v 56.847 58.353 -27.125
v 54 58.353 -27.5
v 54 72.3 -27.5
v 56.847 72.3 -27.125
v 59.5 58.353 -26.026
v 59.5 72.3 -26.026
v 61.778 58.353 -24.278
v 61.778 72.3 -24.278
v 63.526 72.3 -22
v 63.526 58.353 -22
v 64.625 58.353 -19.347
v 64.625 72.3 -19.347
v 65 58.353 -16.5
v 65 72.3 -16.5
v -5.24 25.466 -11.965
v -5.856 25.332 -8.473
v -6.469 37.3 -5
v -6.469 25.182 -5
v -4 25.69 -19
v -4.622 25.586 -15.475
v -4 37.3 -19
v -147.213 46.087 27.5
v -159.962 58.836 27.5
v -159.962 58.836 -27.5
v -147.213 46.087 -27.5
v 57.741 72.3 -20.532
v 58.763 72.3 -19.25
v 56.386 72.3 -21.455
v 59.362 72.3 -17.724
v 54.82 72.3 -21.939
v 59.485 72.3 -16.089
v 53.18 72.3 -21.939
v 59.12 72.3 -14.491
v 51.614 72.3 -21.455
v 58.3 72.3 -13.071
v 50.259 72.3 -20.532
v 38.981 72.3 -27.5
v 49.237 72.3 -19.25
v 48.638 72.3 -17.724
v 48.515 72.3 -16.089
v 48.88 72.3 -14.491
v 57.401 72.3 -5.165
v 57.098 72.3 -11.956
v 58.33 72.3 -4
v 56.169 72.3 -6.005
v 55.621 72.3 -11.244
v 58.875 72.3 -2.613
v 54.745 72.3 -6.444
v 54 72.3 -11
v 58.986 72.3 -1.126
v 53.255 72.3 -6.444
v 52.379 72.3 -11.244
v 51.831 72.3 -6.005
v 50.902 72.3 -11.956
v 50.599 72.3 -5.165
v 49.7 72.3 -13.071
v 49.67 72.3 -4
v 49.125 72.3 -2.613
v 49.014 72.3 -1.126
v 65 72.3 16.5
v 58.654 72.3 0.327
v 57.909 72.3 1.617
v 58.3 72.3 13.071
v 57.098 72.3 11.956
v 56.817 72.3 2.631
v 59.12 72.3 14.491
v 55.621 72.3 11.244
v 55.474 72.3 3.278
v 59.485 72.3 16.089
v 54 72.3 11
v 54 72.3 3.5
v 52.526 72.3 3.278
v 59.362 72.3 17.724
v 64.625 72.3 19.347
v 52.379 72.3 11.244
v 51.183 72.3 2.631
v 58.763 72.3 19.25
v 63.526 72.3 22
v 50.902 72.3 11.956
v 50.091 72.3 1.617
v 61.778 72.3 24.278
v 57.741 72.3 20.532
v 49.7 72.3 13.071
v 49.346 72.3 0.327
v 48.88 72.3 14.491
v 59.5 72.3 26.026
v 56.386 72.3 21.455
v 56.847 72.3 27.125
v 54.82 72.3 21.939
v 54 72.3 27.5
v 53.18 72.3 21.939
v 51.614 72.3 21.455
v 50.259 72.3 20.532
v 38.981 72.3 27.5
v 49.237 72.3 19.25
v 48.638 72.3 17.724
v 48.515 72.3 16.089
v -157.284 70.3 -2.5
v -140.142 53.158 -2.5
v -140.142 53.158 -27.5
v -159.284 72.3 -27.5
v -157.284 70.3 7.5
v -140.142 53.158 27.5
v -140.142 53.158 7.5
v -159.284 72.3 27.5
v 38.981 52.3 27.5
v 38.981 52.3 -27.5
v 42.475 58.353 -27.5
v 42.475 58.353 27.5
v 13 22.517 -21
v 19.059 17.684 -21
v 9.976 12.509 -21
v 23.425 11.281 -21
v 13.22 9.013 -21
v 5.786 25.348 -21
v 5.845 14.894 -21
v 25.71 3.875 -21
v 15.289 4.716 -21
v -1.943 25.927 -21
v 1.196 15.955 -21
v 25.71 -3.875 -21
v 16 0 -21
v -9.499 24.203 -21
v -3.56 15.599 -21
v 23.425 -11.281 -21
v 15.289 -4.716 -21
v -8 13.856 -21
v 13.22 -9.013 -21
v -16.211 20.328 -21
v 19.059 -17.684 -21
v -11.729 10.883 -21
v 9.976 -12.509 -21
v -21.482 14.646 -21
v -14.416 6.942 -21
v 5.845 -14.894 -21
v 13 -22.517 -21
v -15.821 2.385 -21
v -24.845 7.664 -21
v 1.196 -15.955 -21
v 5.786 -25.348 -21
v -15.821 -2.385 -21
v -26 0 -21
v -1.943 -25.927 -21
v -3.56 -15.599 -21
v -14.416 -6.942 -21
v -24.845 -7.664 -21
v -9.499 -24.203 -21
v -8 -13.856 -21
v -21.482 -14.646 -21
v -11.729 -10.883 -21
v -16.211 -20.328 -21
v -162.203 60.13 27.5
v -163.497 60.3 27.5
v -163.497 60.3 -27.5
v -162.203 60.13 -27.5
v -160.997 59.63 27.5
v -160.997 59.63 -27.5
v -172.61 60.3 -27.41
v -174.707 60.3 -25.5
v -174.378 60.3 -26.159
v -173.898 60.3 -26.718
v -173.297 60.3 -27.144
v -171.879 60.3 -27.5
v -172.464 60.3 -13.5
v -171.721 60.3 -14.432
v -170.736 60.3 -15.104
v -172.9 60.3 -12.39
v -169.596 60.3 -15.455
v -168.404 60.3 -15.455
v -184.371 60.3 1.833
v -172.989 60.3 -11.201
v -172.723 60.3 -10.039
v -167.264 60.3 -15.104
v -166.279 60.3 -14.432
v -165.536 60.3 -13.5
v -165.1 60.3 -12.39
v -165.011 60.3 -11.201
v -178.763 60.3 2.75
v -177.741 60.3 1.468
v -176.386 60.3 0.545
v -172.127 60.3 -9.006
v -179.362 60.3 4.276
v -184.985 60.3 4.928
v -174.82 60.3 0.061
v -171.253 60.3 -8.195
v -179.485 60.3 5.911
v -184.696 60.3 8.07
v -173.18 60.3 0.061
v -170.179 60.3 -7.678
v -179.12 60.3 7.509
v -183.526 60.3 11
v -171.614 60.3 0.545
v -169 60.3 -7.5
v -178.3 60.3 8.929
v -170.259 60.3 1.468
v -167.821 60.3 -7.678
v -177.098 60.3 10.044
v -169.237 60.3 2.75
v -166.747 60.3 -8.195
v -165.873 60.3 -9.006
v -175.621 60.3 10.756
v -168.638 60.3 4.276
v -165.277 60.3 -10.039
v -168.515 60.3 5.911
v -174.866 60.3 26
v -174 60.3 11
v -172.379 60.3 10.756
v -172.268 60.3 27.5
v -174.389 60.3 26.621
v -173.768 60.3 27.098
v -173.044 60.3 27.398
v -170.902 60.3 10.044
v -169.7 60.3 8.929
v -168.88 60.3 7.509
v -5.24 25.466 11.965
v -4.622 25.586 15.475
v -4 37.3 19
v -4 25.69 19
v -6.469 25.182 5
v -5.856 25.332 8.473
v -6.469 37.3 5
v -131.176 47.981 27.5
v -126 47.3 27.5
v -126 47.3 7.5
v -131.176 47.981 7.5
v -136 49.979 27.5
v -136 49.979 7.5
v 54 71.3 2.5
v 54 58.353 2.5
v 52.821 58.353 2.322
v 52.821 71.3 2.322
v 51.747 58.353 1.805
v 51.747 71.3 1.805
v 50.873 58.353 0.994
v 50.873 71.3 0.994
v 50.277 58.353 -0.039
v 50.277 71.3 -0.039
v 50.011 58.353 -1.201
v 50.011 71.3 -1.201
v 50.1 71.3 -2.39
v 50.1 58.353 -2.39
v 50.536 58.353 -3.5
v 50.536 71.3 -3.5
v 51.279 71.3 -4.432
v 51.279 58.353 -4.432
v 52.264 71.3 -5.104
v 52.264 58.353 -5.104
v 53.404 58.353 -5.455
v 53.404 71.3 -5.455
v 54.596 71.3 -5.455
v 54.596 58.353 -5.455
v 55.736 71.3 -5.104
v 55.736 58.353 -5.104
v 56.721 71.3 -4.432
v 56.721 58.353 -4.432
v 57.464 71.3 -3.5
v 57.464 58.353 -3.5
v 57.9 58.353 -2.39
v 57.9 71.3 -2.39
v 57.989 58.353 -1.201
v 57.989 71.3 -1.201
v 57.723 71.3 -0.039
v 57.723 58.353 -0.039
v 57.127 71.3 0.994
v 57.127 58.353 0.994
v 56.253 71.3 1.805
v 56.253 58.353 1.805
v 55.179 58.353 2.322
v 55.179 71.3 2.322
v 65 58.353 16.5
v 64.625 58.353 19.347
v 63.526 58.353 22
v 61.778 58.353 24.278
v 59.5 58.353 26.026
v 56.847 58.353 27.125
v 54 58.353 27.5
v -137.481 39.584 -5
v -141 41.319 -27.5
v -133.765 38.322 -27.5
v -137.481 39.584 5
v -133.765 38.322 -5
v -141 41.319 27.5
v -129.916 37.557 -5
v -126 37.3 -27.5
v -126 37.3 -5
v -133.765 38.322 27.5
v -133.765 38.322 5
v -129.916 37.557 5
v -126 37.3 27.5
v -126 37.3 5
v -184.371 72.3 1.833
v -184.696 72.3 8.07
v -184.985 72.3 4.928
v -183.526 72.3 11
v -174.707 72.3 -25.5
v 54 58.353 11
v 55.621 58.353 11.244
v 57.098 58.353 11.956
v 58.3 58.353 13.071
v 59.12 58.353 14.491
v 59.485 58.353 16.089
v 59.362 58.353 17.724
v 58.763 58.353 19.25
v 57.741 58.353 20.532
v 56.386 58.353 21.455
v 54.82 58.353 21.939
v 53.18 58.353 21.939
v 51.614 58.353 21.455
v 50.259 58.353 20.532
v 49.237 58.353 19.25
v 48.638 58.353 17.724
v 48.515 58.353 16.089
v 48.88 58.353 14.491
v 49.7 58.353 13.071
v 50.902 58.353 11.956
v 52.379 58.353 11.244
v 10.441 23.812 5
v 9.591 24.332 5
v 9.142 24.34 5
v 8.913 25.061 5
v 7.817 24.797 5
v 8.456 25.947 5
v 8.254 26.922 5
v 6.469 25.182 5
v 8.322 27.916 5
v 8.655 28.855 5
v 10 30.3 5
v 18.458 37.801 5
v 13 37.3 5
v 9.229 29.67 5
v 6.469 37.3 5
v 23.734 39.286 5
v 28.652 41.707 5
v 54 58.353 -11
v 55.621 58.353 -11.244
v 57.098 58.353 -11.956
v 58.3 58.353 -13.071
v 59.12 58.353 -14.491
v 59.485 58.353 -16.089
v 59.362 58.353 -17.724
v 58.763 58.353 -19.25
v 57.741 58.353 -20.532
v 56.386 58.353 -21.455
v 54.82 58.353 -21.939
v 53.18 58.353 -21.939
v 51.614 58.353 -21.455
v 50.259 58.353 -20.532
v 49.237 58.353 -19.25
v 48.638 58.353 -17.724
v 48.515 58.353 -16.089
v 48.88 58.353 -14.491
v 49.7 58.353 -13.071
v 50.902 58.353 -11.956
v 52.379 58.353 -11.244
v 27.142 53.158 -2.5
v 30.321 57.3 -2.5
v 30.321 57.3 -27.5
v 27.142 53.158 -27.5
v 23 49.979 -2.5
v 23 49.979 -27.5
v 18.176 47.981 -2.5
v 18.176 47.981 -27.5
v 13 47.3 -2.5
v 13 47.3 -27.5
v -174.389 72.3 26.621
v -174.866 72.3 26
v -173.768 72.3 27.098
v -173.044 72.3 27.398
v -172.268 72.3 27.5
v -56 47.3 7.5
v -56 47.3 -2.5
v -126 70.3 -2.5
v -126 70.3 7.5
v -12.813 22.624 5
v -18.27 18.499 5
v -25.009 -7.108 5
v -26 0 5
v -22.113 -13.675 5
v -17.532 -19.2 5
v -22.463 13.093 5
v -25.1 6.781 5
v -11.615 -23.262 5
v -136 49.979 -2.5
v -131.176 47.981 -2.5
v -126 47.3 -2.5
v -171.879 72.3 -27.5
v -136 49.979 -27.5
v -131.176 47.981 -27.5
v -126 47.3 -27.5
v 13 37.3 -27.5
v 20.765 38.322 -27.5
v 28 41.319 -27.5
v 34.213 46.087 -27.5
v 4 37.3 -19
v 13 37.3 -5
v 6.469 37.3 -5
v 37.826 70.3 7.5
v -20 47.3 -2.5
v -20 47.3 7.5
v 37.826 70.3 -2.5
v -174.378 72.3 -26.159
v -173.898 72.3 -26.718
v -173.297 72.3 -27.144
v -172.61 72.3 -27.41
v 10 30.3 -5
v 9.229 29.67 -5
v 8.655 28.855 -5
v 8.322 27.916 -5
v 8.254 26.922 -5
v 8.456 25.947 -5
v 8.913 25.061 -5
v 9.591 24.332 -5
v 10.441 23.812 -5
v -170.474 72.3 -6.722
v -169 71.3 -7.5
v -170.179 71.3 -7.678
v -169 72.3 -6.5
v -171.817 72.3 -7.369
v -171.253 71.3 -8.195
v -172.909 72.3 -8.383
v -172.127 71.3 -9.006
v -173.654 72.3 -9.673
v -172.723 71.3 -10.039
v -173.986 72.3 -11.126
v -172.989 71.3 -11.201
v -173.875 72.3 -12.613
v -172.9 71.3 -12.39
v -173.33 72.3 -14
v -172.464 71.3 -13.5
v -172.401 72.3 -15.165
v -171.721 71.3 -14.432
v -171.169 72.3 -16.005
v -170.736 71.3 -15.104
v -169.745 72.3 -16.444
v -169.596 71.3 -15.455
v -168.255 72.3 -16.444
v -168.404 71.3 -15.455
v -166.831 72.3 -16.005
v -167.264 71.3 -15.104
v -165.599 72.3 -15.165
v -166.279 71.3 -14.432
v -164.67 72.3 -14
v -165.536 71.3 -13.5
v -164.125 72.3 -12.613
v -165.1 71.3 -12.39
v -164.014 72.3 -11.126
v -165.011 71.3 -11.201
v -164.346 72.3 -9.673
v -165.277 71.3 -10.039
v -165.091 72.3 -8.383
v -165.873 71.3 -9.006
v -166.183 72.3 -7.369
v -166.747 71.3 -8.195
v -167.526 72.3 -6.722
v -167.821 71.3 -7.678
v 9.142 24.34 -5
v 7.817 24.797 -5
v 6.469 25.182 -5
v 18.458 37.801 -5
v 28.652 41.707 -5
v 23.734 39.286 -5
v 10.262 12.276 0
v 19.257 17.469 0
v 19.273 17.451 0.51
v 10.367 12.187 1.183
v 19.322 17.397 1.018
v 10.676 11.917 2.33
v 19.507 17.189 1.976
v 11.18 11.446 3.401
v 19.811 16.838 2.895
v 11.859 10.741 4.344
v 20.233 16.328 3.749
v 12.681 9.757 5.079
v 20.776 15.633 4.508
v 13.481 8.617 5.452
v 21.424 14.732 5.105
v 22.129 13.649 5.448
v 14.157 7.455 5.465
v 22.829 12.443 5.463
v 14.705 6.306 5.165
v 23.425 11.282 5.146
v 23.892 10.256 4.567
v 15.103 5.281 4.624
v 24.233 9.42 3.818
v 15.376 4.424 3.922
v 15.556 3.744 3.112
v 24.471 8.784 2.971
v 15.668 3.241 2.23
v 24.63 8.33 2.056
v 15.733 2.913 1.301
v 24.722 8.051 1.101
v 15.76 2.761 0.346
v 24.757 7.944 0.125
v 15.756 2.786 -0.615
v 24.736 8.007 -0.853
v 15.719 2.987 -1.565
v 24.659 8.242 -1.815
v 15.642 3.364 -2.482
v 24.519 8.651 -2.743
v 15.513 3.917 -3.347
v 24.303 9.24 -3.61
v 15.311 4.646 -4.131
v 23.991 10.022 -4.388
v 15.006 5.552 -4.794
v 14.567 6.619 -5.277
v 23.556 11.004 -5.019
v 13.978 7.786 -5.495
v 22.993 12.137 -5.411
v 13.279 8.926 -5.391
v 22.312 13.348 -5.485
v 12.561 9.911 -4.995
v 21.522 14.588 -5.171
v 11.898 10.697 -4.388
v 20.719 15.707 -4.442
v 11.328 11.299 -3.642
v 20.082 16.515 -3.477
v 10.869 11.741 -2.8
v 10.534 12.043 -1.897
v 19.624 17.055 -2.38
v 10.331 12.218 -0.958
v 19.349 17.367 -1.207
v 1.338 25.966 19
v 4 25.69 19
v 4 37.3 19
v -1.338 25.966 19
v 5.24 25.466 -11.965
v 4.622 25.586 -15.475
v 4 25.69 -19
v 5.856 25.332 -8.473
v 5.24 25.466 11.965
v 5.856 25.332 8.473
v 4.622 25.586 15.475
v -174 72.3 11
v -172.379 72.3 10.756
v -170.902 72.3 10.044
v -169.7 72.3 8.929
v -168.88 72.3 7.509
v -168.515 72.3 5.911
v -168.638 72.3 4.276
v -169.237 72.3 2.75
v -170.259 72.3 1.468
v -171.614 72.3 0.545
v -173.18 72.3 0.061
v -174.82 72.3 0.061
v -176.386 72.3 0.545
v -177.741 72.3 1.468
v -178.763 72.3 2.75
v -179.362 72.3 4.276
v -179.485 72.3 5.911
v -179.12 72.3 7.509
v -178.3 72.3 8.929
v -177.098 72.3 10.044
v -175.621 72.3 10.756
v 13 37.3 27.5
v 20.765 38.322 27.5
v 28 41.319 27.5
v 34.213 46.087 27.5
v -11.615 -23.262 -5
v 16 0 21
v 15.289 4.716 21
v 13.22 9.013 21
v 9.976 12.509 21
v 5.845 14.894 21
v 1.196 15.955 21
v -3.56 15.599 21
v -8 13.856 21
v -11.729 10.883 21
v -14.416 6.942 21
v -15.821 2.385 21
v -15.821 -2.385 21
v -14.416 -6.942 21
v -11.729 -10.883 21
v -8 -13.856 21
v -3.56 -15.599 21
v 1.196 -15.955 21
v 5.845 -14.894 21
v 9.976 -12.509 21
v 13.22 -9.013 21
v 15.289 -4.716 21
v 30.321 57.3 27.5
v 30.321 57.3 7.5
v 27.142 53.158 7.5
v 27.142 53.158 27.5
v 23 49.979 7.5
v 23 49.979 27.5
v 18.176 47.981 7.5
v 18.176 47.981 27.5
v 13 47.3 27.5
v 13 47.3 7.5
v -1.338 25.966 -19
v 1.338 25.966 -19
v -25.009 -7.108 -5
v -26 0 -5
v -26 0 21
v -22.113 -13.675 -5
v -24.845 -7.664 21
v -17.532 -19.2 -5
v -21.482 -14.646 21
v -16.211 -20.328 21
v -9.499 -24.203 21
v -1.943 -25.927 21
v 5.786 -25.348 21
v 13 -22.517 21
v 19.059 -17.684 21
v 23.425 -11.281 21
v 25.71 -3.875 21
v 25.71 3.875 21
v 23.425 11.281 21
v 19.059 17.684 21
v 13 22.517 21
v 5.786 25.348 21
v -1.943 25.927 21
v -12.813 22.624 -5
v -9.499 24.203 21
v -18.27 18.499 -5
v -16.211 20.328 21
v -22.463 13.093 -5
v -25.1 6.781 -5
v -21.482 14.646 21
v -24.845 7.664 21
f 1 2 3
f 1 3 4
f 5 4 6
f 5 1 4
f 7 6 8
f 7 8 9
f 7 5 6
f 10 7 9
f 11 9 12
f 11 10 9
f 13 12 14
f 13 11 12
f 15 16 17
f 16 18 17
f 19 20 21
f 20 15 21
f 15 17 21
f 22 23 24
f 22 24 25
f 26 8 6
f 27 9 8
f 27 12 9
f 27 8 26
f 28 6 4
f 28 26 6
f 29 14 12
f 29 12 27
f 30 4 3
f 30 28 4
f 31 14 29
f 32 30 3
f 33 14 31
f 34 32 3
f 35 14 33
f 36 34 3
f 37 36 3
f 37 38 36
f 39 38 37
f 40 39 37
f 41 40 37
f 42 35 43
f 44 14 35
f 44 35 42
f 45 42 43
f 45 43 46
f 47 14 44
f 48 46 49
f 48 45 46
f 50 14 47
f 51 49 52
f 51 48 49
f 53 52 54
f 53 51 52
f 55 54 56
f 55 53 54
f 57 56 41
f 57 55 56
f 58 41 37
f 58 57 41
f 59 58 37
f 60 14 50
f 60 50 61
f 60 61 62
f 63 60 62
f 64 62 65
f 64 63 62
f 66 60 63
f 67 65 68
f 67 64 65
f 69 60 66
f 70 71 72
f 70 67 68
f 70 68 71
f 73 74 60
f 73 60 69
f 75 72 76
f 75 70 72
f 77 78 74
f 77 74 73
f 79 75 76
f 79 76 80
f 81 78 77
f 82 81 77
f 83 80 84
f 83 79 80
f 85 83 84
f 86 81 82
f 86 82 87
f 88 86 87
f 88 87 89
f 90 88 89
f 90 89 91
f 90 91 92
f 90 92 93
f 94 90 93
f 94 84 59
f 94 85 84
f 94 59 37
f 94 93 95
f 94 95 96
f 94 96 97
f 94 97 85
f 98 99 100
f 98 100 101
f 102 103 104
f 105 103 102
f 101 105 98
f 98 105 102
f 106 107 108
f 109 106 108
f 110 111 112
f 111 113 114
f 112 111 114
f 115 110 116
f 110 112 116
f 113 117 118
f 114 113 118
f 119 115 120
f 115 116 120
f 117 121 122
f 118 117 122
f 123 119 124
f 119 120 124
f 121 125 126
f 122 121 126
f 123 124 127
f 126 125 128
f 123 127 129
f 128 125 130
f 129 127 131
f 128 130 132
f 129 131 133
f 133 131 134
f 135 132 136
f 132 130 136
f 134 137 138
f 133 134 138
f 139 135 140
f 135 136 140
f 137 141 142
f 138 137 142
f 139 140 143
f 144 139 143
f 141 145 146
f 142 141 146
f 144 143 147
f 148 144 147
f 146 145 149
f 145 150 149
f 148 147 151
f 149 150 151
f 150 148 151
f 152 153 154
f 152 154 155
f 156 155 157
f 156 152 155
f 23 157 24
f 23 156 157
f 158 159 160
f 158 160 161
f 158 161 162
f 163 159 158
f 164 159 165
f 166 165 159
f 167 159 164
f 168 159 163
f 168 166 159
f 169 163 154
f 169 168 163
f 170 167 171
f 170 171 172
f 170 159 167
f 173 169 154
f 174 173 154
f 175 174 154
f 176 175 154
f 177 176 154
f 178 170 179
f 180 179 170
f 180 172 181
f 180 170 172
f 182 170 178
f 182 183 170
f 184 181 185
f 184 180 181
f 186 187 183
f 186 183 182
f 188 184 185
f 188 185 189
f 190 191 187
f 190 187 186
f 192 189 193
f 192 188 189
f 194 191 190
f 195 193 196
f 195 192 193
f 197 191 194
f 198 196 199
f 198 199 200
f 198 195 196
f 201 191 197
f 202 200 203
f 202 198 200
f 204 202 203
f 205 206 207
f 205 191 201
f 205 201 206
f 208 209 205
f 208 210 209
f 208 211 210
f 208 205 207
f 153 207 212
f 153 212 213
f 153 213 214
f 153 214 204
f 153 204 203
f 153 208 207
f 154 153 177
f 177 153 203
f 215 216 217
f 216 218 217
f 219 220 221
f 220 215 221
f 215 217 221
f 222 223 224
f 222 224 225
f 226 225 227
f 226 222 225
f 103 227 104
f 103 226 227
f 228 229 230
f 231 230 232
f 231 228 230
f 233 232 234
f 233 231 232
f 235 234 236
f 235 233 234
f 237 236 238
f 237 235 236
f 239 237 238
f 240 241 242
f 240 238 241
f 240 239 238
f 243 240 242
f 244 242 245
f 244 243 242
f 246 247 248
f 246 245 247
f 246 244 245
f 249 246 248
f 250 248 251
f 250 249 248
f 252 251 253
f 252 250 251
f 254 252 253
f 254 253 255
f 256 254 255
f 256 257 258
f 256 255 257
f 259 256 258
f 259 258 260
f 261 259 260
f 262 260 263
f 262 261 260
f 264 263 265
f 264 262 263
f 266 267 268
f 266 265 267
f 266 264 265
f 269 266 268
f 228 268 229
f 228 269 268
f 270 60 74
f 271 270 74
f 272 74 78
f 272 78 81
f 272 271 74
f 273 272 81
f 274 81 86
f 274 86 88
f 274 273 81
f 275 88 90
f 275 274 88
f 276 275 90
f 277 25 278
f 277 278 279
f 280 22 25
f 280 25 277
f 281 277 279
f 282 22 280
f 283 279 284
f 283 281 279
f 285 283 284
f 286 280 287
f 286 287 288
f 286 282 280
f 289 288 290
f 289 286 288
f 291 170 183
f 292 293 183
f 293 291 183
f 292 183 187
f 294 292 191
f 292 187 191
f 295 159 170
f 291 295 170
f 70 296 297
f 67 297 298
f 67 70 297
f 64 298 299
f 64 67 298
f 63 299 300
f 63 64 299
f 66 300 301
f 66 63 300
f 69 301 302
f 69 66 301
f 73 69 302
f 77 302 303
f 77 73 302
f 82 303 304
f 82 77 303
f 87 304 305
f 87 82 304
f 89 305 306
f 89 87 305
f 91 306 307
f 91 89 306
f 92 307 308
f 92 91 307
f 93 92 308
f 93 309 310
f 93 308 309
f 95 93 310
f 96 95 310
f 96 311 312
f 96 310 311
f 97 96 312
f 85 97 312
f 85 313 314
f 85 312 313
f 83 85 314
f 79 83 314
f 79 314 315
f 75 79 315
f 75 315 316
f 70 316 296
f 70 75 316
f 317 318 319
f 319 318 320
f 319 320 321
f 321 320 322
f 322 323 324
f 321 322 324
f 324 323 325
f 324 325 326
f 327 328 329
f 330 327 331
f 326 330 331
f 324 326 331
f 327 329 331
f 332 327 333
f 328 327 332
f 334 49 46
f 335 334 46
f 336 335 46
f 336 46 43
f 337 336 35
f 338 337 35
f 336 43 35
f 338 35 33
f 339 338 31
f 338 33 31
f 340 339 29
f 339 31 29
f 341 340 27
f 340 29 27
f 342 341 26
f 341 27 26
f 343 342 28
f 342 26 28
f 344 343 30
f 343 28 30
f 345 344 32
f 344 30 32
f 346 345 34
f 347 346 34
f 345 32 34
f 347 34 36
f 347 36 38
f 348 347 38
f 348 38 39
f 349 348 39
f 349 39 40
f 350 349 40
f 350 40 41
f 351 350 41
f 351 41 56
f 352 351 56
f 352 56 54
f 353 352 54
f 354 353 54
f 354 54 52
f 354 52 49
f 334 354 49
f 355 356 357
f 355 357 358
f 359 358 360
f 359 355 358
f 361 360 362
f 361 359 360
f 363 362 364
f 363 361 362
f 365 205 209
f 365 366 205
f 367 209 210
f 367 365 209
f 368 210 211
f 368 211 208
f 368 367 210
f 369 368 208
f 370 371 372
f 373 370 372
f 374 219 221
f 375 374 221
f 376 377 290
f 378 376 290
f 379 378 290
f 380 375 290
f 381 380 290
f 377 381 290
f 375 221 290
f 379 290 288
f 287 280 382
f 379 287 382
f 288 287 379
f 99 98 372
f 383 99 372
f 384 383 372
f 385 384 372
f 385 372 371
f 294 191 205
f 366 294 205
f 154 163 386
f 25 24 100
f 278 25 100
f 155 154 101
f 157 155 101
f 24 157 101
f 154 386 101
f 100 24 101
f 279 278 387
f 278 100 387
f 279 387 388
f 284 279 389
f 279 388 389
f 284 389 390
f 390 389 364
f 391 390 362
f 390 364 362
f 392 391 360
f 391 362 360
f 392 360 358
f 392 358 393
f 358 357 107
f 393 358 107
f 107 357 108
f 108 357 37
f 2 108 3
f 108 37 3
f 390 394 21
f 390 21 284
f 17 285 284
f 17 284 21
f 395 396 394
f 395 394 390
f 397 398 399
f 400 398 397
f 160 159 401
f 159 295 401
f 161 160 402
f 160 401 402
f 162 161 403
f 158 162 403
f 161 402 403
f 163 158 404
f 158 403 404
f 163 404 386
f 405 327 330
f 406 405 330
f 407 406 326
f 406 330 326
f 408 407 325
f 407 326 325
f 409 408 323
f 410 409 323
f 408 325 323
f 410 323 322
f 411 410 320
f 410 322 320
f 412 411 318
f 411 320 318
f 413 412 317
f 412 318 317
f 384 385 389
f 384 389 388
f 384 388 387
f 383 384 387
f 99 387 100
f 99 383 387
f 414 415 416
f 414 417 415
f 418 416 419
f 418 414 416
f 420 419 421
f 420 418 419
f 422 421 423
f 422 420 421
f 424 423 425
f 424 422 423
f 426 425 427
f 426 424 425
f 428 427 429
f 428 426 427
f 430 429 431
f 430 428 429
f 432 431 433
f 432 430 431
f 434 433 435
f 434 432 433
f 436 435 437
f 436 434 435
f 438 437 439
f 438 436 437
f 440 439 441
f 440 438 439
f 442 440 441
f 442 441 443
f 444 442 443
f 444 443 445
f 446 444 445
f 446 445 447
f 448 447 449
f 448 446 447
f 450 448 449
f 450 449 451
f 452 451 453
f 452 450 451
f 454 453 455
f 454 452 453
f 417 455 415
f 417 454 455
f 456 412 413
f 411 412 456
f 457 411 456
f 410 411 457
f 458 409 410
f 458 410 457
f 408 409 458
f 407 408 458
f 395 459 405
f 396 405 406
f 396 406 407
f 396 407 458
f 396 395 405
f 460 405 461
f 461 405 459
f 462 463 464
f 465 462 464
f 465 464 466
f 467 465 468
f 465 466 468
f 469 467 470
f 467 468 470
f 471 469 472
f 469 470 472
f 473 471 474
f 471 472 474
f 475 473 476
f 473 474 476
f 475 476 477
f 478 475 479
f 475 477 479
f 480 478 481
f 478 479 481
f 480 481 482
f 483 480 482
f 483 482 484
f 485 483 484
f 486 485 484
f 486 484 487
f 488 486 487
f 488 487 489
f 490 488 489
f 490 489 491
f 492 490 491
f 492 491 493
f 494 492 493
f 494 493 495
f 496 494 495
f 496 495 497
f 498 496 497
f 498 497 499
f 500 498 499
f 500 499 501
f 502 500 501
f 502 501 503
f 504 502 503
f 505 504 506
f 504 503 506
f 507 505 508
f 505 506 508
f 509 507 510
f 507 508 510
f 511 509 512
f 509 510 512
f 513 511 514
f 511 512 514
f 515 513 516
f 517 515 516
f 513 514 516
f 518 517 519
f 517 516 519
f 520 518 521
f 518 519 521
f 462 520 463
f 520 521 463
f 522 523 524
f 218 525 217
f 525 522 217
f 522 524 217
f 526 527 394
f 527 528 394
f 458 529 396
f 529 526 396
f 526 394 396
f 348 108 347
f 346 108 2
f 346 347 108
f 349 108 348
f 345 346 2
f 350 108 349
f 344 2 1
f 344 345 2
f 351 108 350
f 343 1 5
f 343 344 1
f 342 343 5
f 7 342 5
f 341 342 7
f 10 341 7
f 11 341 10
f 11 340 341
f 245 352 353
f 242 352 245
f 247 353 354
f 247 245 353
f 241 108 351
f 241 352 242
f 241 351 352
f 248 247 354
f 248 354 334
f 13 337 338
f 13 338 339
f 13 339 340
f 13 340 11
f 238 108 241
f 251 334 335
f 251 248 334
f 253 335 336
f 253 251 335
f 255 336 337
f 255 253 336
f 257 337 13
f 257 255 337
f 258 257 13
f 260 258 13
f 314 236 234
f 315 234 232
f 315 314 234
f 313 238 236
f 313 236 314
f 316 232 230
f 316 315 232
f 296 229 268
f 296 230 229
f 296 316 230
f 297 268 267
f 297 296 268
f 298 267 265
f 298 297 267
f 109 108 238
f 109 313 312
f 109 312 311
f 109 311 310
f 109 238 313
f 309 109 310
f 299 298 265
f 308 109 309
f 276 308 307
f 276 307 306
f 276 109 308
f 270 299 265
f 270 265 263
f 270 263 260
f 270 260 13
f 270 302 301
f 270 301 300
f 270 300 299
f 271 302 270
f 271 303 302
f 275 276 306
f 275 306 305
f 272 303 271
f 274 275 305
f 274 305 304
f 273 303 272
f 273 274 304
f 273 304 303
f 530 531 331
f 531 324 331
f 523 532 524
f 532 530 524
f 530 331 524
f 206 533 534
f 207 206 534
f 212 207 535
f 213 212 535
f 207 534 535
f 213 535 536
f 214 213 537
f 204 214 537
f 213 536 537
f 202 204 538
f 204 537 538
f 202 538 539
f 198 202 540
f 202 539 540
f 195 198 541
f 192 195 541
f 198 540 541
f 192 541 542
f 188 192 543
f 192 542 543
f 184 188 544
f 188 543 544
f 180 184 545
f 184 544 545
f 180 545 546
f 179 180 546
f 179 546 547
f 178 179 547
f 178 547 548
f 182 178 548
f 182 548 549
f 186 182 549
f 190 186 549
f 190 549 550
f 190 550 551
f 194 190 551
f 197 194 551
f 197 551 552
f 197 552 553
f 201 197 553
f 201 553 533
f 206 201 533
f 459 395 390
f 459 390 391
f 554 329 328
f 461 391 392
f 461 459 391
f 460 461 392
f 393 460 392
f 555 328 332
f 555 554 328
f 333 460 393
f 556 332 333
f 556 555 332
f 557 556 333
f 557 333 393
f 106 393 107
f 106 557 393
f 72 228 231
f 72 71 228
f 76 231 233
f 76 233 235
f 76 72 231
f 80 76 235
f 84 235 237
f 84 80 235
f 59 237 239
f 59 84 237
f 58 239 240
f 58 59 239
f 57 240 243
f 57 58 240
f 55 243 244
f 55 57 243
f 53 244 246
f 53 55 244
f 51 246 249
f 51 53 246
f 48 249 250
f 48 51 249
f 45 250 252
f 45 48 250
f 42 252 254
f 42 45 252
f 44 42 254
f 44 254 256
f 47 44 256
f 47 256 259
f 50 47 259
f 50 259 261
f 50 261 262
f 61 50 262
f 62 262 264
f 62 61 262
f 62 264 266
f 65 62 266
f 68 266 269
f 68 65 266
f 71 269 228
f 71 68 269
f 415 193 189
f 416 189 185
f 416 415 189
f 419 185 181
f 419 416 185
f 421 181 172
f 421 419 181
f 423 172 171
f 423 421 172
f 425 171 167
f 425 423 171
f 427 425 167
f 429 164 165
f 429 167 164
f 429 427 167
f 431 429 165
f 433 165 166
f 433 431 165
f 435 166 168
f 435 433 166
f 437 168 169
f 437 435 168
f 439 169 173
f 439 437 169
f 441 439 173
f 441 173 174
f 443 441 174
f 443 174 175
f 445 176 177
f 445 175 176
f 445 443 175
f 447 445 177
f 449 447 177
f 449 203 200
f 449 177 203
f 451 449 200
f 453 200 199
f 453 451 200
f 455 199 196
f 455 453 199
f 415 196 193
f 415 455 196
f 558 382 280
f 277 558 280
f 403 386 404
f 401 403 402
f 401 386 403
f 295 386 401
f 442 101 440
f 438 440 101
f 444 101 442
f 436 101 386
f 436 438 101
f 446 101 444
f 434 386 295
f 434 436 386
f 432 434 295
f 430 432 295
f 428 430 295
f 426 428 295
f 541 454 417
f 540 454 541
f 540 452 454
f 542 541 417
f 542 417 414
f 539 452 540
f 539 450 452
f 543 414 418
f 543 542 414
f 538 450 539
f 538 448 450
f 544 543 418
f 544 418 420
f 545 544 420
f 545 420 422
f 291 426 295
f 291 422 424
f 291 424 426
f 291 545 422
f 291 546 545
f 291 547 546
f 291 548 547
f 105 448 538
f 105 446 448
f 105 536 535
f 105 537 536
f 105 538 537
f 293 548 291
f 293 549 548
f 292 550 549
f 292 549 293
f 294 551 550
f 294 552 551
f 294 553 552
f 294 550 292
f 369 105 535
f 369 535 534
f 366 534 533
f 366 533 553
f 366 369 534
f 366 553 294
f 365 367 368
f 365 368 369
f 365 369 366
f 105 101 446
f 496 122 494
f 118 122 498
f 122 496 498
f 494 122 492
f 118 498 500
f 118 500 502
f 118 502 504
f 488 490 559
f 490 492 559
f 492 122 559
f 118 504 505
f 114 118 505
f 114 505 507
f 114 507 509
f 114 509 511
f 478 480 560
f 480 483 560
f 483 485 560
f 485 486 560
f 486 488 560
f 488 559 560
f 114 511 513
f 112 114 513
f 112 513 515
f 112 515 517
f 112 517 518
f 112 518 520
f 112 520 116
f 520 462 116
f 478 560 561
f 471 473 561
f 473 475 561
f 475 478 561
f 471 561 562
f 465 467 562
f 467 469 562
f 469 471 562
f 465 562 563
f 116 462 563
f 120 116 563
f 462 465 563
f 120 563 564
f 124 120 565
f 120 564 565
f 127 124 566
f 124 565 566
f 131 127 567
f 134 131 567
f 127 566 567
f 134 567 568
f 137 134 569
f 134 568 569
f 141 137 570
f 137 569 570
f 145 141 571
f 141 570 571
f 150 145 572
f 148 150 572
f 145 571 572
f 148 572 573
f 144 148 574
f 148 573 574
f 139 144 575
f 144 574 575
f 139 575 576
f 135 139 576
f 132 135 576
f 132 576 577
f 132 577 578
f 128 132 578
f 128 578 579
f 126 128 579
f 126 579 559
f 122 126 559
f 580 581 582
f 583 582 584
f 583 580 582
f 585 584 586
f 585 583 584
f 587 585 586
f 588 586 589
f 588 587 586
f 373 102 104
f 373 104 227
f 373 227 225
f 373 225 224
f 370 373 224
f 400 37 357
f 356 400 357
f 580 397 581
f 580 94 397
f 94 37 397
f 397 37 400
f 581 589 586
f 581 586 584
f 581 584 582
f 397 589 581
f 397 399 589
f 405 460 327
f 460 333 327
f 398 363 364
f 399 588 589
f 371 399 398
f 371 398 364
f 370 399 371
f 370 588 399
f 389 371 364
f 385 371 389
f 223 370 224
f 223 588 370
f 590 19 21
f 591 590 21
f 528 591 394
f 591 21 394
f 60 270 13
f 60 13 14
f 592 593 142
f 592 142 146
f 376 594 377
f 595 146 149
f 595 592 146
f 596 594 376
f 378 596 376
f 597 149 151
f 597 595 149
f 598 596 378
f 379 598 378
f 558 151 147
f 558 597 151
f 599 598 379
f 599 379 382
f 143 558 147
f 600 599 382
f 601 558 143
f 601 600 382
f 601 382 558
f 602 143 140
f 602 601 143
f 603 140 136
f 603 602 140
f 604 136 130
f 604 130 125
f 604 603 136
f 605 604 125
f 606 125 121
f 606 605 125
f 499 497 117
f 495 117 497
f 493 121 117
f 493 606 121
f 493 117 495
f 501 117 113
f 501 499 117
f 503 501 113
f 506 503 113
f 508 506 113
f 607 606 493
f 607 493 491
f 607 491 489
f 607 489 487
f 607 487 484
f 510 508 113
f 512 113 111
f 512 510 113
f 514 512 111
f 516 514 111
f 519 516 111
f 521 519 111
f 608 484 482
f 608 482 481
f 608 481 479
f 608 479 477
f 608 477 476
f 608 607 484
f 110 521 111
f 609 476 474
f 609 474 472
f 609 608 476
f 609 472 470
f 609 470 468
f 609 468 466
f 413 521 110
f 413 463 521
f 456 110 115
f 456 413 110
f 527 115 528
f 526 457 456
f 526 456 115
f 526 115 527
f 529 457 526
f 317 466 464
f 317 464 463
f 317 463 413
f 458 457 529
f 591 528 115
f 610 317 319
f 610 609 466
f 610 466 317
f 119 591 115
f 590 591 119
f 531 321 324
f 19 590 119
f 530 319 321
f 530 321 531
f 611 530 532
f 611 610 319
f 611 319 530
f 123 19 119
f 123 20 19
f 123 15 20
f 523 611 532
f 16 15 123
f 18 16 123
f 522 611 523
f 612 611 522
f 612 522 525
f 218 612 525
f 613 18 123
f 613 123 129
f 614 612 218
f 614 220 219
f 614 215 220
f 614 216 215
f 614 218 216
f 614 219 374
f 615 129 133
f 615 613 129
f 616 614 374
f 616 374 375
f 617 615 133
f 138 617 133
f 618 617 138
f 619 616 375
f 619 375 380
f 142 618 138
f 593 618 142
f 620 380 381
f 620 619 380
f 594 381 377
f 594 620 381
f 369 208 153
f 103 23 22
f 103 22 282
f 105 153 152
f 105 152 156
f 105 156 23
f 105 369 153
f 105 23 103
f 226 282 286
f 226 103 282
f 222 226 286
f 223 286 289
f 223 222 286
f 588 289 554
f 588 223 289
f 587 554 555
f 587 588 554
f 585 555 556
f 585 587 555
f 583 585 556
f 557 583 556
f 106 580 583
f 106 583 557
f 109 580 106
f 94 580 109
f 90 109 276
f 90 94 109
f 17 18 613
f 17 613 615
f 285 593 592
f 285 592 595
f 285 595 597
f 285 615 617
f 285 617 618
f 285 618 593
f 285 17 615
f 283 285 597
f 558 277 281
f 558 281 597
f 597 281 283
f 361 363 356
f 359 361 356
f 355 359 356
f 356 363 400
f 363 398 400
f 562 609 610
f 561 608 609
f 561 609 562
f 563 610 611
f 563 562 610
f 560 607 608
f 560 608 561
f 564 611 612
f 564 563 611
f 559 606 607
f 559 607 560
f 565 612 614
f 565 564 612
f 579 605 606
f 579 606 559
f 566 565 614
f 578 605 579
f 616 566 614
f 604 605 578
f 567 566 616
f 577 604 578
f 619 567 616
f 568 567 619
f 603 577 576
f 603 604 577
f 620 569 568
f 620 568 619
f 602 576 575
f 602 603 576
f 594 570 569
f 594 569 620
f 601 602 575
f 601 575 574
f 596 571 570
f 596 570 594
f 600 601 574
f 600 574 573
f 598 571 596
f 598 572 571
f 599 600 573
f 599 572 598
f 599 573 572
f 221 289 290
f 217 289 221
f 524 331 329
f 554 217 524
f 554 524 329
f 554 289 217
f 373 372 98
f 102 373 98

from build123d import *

# Parameters (mm, degrees)
SKETCH_1_R               = 26
EXTRUDE_1_DEPTH          = 21
SKETCH_2_R               = 16
CUT_EXTRUDE_1_DEPTH      = 56.821142948
CUT_EXTRUDE_2_REACH      = 67.695
CUT_EXTRUDE_2_END_RADIUS = 16
SKETCH_3_R               = 5.5
EXTRUDE_2_DEPTH          = 27.5
CUT_EXTRUDE_4_DEPTH      = 212.291599501
CUT_EXTRUDE_4_DEPTH_BACK = 212.291599501
CUT_EXTRUDE_START        = -13.947107552
CUT_EXTRUDE_6_DEPTH      = 13.947107552
SKETCH_7_R               = 5.5
CUT_EXTRUDE_7_DEPTH      = 212.291599501
SKETCH_8_R               = 5.5
CUT_EXTRUDE_8_DEPTH      = 212.291599501
RIB_1_DEPTH              = 10
FILLET_1_R               = 3
RIB_8_REACH              = 202.879
SKETCH_16_WALL_W         = 465.989842276
SKETCH_16_WALL_H         = 10
EXTRUDE_3_DEPTH          = 5
EXTRUDE_4_REACH          = 199.454
EXTRUDE_4_END_RADIUS     = 26


# Read off the part's stored shape, not the designer's step: 切除-拉伸6, 筋1
with BuildPart() as part:
    # 草图1 → 凸台-拉伸1 (new, symmetric)
    with BuildSketch(Plane.XY):
        with Locations(Location((0, 0, 0), (0, 0, 180))):
            Circle(SKETCH_1_R)
    extrude(amount=EXTRUDE_1_DEPTH, both=True)

    # 草图2 → 切除-拉伸1 (cut, through all)
    with BuildSketch(Plane.XY.offset(21)):
        Circle(SKETCH_2_R)
    extrude(amount=-CUT_EXTRUDE_1_DEPTH, mode=Mode.SUBTRACT)

    # 切除-拉伸2: up to this cylinder (the profile starts outside it)
    cut_extrude_2_end = Plane(origin=(0, 0, 0), z_dir=(0, 0, 1)) * Cylinder(CUT_EXTRUDE_2_END_RADIUS, 168.39, mode=Mode.PRIVATE)
    # 草图3 → 切除-拉伸2 (cut, up to the surface)
    with BuildSketch(Plane(origin=(22.516660498, 13, 0), x_dir=(0, 0, -1), z_dir=(0.8660254037844398, 0.499999999999998, 0)), mode=Mode.PRIVATE) as cut_extrude_2_sk1:
        with Locations(Location((0, 0, 0), (0, 0, 90))):
            Circle(SKETCH_3_R)
    cut_extrude_2_tool1 = extrude(cut_extrude_2_sk1.sketch, amount=-CUT_EXTRUDE_2_REACH, mode=Mode.PRIVATE) - cut_extrude_2_end
    add(cut_extrude_2_tool1.solids().sort_by_distance((22.51666, 13, 0))[0], mode=Mode.SUBTRACT)



with BuildPart() as body_2:
    # 草图4 → 凸台-拉伸2 (new, symmetric)
    with BuildSketch(Plane.XY):
        with BuildLine():
            Line((-185, 60.3), (-163.497474683, 60.3))
            ThreePointArc((-163.497474683, 60.3), (-161.584057521, 59.919397663), (-159.961940777, 58.835533906))
            Line((-159.961940777, 58.835533906), (-147.213203436, 46.086796564))
            ThreePointArc((-147.213203436, 46.086796564), (-137.480502971, 39.583614025), (-126, 37.3))
            Line((-126, 37.3), (13, 37.3))
            ThreePointArc((13, 37.3), (28, 41.319237886), (38.980762114, 52.3))
            Line((38.980762114, 52.3), (42.475401198, 58.352892448))
            Line((42.475401198, 58.352892448), (65, 58.352892448))
            Line((65, 58.352892448), (65, 72.3))
            Line((65, 72.3), (38.980762114, 72.3))
            Line((38.980762114, 72.3), (30.320508076, 57.3))
            ThreePointArc((30.320508076, 57.3), (23, 49.979491924), (13, 47.3))
            Line((13, 47.3), (-126, 47.3))
            ThreePointArc((-126, 47.3), (-133.653668647, 48.82240935), (-140.142135624, 53.157864376))
            Line((-140.142135624, 53.157864376), (-159.284271247, 72.3))
            Line((-159.284271247, 72.3), (-185, 72.3))
            Line((-185, 72.3), (-185, 60.3))
        make_face()
    extrude(amount=EXTRUDE_2_DEPTH, both=True)

    # 草图5 → 切除-拉伸4 (cut, two sides: drawn at the far end of the back side and taken through both)
    with BuildSketch(Plane(origin=(0, 72.3, 0), x_dir=(1, 0, 0), z_dir=(0, 1, 0)).offset(-CUT_EXTRUDE_4_DEPTH_BACK)):
        with BuildLine():
            Line((-7.168790364, 499.369918589), (-174, 27.5))
            Line((-174, 27.5), (-184.370899457, -1.833333333))
            ThreePointArc((-184.370899457, -1.833333333), (-184.953601074, -6.509268805), (-183.526279442, -11))
            Line((-183.526279442, -11), (-174, -27.5))
            Line((-174, -27.5), (76.246814454, -460.940197067))
            Line((76.246814454, -460.940197067), (-920.985347946, -547.562968831))
            Line((-920.985347946, -547.562968831), (-1004.400952764, 412.747146826))
            Line((-1004.400952764, 412.747146826), (-7.168790364, 499.369918589))
        make_face()
    extrude(amount=CUT_EXTRUDE_4_DEPTH + CUT_EXTRUDE_4_DEPTH_BACK, mode=Mode.SUBTRACT)

    # 切除-拉伸6 outline → 切除-拉伸6 (cut)
    with BuildSketch(Plane(origin=(0, 72.3, 0), x_dir=(1, 0, 0), z_dir=(0, 1, 0)).offset(CUT_EXTRUDE_START)):
        with BuildLine():
            Line((65, -27.5), (65, -16.5))
            ThreePointArc((65, -16.5), (61.778174593, -24.278174593), (54, -27.5))
            Line((54, -27.5), (65, -27.5))
        make_face()
        with BuildLine():
            ThreePointArc((54, 27.5), (61.778174593, 24.278174593), (65, 16.5))
            Line((65, 16.5), (65, 27.5))
            Line((65, 27.5), (54, 27.5))
        make_face()
    extrude(amount=CUT_EXTRUDE_6_DEPTH, mode=Mode.SUBTRACT)

    # 草图7 → 切除-拉伸7 (cut, through all)
    with BuildSketch(Plane(origin=(0, 72.3, 0), x_dir=(1, 0, 0), z_dir=(0, 1, 0))):
        with Locations(Location((54, 16.5, 0), (0, 0, 270))):
            Circle(SKETCH_7_R)
    cut_extrude_7 = extrude(amount=-CUT_EXTRUDE_7_DEPTH, mode=Mode.SUBTRACT)

    # 镜向1: 切除-拉伸7 across plane
    add(cut_extrude_7.mirror(Plane.XY), mode=Mode.SUBTRACT)

    # 草图8 → 切除-拉伸8 (cut, through all)
    with BuildSketch(Plane(origin=(0, 72.3, 0), x_dir=(1, 0, 0), z_dir=(0, 1, 0))):
        with Locations(Location((-174, -5.5, 0), (0, 0, 270))):
            Circle(SKETCH_8_R)
    extrude(amount=-CUT_EXTRUDE_8_DEPTH, mode=Mode.SUBTRACT)

    # 草图10 → Ø8.0mm 暗销孔1 (revolve, cut)
    with BuildSketch(Plane(origin=(54, 72.3, -1.5), x_dir=(0, 0, 1), z_dir=(1, 0, 0))):
        Polygon((0, 0), (0, 13.948107552), (4, 13.948107552), (4, 1), (5, 0), align=None)
    revolve(axis=Axis((54, 78.65, -1.5), (0, -1, 0)), mode=Mode.SUBTRACT)

    # 草图12 → Ø8.0mm 暗销孔2 (revolve, cut)
    with BuildSketch(Plane(origin=(-169, 72.3, -11.5), x_dir=(0, 0, 1), z_dir=(1, 0, 0))):
        Polygon((0, 0), (0, 12.001), (4, 12.001), (4, 1), (5, 0), align=None)
    revolve(axis=Axis((-169, 78.65, -11.5), (0, -1, 0)), mode=Mode.SUBTRACT)

    # 筋1 outline → 筋1 (add)
    with BuildSketch(Plane.XY.offset(-2.5)):
        with BuildLine():
            Line((-56, 47.3), (-126, 70.3))
            Line((-126, 70.3), (-157.284271247, 70.3))
            Line((-157.284271247, 70.3), (-140.142135624, 53.157864376))
            ThreePointArc((-140.142135624, 53.157864376), (-133.653668647, 48.82240935), (-126, 47.3))
            Line((-126, 47.3), (-56, 47.3))
        make_face()
    extrude(amount=RIB_1_DEPTH)

    # 圆角1
    fillet_1_edges = [body_2.edges().sort_by_distance(p)[0] for p in [
        (-174, 66.3, -27.5),
        (-174, 66.3, 27.5),
    ]]
    fillet(fillet_1_edges, radius=FILLET_1_R)

    # 草图16 wall → 筋8 (add, up to next)
    with BuildSketch(Plane(origin=(8.913030787, 58.8, -2.5), x_dir=(0.929197613161, 0.369583273019, 0), z_dir=(-0.369583273019, 0.929197613161, 0)), mode=Mode.PRIVATE) as rib_8_sk1:
        with Locations((0, -5)):
            Rectangle(SKETCH_16_WALL_W, SKETCH_16_WALL_H)
    rib_8_tool1 = extrude(rib_8_sk1.sketch, amount=-RIB_8_REACH, mode=Mode.PRIVATE) - body_2.part
    add(rib_8_tool1.solids().sort_by_distance((8.913030787, 58.8, -2.5))[0])


with BuildPart() as part_1:
    add(part.part)

    add(body_2.part)  # 凸台-拉伸3 merges body 2
    # 草图17 → 凸台-拉伸3 (add, symmetric)
    with BuildSketch(Plane.XY):
        with BuildLine():
            Line((-11.614576615, -23.261590875), (-137.480502971, 39.583614025))
            ThreePointArc((-137.480502971, 39.583614025), (-131.85270966, 37.876441588), (-126, 37.3))
            Line((-126, 37.3), (13, 37.3))
            ThreePointArc((13, 37.3), (21.130139995, 38.422658993), (28.651788339, 41.706611756))
            Line((28.651788339, 41.706611756), (10, 30.3))
            ThreePointArc((10, 30.3), (8.254139309, 26.922225109), (10.440740808, 23.811571375))
            ThreePointArc((10.440740808, 23.811571375), (-23.543897802, 11.031086814), (-11.614576615, -23.261590875))
        make_face()
    extrude(amount=EXTRUDE_3_DEPTH, both=True)

    # 凸台-拉伸4: up to this cylinder (the profile starts outside it)
    extrude_4_end = Plane(origin=(0, 0, 0), z_dir=(0, 0, -1)) * Cylinder(EXTRUDE_4_END_RADIUS, 451.908, mode=Mode.PRIVATE)
    # 草图19 → 凸台-拉伸4 (add, up to the surface)
    with BuildSketch(Plane.XZ.offset(-37.3), mode=Mode.PRIVATE) as extrude_4_sk1:
        Polygon((-4, -19), (4, -19), (7.350212633, 0), (4, 19), (-4, 19), (-7.350212633, 0), align=None)
    extrude_4_tool1 = extrude(extrude_4_sk1.sketch, amount=EXTRUDE_4_REACH, mode=Mode.PRIVATE) - extrude_4_end
    add(extrude_4_tool1.solids().sort_by_distance((0, 37.3, 0))[0])


solid = part_1.part
